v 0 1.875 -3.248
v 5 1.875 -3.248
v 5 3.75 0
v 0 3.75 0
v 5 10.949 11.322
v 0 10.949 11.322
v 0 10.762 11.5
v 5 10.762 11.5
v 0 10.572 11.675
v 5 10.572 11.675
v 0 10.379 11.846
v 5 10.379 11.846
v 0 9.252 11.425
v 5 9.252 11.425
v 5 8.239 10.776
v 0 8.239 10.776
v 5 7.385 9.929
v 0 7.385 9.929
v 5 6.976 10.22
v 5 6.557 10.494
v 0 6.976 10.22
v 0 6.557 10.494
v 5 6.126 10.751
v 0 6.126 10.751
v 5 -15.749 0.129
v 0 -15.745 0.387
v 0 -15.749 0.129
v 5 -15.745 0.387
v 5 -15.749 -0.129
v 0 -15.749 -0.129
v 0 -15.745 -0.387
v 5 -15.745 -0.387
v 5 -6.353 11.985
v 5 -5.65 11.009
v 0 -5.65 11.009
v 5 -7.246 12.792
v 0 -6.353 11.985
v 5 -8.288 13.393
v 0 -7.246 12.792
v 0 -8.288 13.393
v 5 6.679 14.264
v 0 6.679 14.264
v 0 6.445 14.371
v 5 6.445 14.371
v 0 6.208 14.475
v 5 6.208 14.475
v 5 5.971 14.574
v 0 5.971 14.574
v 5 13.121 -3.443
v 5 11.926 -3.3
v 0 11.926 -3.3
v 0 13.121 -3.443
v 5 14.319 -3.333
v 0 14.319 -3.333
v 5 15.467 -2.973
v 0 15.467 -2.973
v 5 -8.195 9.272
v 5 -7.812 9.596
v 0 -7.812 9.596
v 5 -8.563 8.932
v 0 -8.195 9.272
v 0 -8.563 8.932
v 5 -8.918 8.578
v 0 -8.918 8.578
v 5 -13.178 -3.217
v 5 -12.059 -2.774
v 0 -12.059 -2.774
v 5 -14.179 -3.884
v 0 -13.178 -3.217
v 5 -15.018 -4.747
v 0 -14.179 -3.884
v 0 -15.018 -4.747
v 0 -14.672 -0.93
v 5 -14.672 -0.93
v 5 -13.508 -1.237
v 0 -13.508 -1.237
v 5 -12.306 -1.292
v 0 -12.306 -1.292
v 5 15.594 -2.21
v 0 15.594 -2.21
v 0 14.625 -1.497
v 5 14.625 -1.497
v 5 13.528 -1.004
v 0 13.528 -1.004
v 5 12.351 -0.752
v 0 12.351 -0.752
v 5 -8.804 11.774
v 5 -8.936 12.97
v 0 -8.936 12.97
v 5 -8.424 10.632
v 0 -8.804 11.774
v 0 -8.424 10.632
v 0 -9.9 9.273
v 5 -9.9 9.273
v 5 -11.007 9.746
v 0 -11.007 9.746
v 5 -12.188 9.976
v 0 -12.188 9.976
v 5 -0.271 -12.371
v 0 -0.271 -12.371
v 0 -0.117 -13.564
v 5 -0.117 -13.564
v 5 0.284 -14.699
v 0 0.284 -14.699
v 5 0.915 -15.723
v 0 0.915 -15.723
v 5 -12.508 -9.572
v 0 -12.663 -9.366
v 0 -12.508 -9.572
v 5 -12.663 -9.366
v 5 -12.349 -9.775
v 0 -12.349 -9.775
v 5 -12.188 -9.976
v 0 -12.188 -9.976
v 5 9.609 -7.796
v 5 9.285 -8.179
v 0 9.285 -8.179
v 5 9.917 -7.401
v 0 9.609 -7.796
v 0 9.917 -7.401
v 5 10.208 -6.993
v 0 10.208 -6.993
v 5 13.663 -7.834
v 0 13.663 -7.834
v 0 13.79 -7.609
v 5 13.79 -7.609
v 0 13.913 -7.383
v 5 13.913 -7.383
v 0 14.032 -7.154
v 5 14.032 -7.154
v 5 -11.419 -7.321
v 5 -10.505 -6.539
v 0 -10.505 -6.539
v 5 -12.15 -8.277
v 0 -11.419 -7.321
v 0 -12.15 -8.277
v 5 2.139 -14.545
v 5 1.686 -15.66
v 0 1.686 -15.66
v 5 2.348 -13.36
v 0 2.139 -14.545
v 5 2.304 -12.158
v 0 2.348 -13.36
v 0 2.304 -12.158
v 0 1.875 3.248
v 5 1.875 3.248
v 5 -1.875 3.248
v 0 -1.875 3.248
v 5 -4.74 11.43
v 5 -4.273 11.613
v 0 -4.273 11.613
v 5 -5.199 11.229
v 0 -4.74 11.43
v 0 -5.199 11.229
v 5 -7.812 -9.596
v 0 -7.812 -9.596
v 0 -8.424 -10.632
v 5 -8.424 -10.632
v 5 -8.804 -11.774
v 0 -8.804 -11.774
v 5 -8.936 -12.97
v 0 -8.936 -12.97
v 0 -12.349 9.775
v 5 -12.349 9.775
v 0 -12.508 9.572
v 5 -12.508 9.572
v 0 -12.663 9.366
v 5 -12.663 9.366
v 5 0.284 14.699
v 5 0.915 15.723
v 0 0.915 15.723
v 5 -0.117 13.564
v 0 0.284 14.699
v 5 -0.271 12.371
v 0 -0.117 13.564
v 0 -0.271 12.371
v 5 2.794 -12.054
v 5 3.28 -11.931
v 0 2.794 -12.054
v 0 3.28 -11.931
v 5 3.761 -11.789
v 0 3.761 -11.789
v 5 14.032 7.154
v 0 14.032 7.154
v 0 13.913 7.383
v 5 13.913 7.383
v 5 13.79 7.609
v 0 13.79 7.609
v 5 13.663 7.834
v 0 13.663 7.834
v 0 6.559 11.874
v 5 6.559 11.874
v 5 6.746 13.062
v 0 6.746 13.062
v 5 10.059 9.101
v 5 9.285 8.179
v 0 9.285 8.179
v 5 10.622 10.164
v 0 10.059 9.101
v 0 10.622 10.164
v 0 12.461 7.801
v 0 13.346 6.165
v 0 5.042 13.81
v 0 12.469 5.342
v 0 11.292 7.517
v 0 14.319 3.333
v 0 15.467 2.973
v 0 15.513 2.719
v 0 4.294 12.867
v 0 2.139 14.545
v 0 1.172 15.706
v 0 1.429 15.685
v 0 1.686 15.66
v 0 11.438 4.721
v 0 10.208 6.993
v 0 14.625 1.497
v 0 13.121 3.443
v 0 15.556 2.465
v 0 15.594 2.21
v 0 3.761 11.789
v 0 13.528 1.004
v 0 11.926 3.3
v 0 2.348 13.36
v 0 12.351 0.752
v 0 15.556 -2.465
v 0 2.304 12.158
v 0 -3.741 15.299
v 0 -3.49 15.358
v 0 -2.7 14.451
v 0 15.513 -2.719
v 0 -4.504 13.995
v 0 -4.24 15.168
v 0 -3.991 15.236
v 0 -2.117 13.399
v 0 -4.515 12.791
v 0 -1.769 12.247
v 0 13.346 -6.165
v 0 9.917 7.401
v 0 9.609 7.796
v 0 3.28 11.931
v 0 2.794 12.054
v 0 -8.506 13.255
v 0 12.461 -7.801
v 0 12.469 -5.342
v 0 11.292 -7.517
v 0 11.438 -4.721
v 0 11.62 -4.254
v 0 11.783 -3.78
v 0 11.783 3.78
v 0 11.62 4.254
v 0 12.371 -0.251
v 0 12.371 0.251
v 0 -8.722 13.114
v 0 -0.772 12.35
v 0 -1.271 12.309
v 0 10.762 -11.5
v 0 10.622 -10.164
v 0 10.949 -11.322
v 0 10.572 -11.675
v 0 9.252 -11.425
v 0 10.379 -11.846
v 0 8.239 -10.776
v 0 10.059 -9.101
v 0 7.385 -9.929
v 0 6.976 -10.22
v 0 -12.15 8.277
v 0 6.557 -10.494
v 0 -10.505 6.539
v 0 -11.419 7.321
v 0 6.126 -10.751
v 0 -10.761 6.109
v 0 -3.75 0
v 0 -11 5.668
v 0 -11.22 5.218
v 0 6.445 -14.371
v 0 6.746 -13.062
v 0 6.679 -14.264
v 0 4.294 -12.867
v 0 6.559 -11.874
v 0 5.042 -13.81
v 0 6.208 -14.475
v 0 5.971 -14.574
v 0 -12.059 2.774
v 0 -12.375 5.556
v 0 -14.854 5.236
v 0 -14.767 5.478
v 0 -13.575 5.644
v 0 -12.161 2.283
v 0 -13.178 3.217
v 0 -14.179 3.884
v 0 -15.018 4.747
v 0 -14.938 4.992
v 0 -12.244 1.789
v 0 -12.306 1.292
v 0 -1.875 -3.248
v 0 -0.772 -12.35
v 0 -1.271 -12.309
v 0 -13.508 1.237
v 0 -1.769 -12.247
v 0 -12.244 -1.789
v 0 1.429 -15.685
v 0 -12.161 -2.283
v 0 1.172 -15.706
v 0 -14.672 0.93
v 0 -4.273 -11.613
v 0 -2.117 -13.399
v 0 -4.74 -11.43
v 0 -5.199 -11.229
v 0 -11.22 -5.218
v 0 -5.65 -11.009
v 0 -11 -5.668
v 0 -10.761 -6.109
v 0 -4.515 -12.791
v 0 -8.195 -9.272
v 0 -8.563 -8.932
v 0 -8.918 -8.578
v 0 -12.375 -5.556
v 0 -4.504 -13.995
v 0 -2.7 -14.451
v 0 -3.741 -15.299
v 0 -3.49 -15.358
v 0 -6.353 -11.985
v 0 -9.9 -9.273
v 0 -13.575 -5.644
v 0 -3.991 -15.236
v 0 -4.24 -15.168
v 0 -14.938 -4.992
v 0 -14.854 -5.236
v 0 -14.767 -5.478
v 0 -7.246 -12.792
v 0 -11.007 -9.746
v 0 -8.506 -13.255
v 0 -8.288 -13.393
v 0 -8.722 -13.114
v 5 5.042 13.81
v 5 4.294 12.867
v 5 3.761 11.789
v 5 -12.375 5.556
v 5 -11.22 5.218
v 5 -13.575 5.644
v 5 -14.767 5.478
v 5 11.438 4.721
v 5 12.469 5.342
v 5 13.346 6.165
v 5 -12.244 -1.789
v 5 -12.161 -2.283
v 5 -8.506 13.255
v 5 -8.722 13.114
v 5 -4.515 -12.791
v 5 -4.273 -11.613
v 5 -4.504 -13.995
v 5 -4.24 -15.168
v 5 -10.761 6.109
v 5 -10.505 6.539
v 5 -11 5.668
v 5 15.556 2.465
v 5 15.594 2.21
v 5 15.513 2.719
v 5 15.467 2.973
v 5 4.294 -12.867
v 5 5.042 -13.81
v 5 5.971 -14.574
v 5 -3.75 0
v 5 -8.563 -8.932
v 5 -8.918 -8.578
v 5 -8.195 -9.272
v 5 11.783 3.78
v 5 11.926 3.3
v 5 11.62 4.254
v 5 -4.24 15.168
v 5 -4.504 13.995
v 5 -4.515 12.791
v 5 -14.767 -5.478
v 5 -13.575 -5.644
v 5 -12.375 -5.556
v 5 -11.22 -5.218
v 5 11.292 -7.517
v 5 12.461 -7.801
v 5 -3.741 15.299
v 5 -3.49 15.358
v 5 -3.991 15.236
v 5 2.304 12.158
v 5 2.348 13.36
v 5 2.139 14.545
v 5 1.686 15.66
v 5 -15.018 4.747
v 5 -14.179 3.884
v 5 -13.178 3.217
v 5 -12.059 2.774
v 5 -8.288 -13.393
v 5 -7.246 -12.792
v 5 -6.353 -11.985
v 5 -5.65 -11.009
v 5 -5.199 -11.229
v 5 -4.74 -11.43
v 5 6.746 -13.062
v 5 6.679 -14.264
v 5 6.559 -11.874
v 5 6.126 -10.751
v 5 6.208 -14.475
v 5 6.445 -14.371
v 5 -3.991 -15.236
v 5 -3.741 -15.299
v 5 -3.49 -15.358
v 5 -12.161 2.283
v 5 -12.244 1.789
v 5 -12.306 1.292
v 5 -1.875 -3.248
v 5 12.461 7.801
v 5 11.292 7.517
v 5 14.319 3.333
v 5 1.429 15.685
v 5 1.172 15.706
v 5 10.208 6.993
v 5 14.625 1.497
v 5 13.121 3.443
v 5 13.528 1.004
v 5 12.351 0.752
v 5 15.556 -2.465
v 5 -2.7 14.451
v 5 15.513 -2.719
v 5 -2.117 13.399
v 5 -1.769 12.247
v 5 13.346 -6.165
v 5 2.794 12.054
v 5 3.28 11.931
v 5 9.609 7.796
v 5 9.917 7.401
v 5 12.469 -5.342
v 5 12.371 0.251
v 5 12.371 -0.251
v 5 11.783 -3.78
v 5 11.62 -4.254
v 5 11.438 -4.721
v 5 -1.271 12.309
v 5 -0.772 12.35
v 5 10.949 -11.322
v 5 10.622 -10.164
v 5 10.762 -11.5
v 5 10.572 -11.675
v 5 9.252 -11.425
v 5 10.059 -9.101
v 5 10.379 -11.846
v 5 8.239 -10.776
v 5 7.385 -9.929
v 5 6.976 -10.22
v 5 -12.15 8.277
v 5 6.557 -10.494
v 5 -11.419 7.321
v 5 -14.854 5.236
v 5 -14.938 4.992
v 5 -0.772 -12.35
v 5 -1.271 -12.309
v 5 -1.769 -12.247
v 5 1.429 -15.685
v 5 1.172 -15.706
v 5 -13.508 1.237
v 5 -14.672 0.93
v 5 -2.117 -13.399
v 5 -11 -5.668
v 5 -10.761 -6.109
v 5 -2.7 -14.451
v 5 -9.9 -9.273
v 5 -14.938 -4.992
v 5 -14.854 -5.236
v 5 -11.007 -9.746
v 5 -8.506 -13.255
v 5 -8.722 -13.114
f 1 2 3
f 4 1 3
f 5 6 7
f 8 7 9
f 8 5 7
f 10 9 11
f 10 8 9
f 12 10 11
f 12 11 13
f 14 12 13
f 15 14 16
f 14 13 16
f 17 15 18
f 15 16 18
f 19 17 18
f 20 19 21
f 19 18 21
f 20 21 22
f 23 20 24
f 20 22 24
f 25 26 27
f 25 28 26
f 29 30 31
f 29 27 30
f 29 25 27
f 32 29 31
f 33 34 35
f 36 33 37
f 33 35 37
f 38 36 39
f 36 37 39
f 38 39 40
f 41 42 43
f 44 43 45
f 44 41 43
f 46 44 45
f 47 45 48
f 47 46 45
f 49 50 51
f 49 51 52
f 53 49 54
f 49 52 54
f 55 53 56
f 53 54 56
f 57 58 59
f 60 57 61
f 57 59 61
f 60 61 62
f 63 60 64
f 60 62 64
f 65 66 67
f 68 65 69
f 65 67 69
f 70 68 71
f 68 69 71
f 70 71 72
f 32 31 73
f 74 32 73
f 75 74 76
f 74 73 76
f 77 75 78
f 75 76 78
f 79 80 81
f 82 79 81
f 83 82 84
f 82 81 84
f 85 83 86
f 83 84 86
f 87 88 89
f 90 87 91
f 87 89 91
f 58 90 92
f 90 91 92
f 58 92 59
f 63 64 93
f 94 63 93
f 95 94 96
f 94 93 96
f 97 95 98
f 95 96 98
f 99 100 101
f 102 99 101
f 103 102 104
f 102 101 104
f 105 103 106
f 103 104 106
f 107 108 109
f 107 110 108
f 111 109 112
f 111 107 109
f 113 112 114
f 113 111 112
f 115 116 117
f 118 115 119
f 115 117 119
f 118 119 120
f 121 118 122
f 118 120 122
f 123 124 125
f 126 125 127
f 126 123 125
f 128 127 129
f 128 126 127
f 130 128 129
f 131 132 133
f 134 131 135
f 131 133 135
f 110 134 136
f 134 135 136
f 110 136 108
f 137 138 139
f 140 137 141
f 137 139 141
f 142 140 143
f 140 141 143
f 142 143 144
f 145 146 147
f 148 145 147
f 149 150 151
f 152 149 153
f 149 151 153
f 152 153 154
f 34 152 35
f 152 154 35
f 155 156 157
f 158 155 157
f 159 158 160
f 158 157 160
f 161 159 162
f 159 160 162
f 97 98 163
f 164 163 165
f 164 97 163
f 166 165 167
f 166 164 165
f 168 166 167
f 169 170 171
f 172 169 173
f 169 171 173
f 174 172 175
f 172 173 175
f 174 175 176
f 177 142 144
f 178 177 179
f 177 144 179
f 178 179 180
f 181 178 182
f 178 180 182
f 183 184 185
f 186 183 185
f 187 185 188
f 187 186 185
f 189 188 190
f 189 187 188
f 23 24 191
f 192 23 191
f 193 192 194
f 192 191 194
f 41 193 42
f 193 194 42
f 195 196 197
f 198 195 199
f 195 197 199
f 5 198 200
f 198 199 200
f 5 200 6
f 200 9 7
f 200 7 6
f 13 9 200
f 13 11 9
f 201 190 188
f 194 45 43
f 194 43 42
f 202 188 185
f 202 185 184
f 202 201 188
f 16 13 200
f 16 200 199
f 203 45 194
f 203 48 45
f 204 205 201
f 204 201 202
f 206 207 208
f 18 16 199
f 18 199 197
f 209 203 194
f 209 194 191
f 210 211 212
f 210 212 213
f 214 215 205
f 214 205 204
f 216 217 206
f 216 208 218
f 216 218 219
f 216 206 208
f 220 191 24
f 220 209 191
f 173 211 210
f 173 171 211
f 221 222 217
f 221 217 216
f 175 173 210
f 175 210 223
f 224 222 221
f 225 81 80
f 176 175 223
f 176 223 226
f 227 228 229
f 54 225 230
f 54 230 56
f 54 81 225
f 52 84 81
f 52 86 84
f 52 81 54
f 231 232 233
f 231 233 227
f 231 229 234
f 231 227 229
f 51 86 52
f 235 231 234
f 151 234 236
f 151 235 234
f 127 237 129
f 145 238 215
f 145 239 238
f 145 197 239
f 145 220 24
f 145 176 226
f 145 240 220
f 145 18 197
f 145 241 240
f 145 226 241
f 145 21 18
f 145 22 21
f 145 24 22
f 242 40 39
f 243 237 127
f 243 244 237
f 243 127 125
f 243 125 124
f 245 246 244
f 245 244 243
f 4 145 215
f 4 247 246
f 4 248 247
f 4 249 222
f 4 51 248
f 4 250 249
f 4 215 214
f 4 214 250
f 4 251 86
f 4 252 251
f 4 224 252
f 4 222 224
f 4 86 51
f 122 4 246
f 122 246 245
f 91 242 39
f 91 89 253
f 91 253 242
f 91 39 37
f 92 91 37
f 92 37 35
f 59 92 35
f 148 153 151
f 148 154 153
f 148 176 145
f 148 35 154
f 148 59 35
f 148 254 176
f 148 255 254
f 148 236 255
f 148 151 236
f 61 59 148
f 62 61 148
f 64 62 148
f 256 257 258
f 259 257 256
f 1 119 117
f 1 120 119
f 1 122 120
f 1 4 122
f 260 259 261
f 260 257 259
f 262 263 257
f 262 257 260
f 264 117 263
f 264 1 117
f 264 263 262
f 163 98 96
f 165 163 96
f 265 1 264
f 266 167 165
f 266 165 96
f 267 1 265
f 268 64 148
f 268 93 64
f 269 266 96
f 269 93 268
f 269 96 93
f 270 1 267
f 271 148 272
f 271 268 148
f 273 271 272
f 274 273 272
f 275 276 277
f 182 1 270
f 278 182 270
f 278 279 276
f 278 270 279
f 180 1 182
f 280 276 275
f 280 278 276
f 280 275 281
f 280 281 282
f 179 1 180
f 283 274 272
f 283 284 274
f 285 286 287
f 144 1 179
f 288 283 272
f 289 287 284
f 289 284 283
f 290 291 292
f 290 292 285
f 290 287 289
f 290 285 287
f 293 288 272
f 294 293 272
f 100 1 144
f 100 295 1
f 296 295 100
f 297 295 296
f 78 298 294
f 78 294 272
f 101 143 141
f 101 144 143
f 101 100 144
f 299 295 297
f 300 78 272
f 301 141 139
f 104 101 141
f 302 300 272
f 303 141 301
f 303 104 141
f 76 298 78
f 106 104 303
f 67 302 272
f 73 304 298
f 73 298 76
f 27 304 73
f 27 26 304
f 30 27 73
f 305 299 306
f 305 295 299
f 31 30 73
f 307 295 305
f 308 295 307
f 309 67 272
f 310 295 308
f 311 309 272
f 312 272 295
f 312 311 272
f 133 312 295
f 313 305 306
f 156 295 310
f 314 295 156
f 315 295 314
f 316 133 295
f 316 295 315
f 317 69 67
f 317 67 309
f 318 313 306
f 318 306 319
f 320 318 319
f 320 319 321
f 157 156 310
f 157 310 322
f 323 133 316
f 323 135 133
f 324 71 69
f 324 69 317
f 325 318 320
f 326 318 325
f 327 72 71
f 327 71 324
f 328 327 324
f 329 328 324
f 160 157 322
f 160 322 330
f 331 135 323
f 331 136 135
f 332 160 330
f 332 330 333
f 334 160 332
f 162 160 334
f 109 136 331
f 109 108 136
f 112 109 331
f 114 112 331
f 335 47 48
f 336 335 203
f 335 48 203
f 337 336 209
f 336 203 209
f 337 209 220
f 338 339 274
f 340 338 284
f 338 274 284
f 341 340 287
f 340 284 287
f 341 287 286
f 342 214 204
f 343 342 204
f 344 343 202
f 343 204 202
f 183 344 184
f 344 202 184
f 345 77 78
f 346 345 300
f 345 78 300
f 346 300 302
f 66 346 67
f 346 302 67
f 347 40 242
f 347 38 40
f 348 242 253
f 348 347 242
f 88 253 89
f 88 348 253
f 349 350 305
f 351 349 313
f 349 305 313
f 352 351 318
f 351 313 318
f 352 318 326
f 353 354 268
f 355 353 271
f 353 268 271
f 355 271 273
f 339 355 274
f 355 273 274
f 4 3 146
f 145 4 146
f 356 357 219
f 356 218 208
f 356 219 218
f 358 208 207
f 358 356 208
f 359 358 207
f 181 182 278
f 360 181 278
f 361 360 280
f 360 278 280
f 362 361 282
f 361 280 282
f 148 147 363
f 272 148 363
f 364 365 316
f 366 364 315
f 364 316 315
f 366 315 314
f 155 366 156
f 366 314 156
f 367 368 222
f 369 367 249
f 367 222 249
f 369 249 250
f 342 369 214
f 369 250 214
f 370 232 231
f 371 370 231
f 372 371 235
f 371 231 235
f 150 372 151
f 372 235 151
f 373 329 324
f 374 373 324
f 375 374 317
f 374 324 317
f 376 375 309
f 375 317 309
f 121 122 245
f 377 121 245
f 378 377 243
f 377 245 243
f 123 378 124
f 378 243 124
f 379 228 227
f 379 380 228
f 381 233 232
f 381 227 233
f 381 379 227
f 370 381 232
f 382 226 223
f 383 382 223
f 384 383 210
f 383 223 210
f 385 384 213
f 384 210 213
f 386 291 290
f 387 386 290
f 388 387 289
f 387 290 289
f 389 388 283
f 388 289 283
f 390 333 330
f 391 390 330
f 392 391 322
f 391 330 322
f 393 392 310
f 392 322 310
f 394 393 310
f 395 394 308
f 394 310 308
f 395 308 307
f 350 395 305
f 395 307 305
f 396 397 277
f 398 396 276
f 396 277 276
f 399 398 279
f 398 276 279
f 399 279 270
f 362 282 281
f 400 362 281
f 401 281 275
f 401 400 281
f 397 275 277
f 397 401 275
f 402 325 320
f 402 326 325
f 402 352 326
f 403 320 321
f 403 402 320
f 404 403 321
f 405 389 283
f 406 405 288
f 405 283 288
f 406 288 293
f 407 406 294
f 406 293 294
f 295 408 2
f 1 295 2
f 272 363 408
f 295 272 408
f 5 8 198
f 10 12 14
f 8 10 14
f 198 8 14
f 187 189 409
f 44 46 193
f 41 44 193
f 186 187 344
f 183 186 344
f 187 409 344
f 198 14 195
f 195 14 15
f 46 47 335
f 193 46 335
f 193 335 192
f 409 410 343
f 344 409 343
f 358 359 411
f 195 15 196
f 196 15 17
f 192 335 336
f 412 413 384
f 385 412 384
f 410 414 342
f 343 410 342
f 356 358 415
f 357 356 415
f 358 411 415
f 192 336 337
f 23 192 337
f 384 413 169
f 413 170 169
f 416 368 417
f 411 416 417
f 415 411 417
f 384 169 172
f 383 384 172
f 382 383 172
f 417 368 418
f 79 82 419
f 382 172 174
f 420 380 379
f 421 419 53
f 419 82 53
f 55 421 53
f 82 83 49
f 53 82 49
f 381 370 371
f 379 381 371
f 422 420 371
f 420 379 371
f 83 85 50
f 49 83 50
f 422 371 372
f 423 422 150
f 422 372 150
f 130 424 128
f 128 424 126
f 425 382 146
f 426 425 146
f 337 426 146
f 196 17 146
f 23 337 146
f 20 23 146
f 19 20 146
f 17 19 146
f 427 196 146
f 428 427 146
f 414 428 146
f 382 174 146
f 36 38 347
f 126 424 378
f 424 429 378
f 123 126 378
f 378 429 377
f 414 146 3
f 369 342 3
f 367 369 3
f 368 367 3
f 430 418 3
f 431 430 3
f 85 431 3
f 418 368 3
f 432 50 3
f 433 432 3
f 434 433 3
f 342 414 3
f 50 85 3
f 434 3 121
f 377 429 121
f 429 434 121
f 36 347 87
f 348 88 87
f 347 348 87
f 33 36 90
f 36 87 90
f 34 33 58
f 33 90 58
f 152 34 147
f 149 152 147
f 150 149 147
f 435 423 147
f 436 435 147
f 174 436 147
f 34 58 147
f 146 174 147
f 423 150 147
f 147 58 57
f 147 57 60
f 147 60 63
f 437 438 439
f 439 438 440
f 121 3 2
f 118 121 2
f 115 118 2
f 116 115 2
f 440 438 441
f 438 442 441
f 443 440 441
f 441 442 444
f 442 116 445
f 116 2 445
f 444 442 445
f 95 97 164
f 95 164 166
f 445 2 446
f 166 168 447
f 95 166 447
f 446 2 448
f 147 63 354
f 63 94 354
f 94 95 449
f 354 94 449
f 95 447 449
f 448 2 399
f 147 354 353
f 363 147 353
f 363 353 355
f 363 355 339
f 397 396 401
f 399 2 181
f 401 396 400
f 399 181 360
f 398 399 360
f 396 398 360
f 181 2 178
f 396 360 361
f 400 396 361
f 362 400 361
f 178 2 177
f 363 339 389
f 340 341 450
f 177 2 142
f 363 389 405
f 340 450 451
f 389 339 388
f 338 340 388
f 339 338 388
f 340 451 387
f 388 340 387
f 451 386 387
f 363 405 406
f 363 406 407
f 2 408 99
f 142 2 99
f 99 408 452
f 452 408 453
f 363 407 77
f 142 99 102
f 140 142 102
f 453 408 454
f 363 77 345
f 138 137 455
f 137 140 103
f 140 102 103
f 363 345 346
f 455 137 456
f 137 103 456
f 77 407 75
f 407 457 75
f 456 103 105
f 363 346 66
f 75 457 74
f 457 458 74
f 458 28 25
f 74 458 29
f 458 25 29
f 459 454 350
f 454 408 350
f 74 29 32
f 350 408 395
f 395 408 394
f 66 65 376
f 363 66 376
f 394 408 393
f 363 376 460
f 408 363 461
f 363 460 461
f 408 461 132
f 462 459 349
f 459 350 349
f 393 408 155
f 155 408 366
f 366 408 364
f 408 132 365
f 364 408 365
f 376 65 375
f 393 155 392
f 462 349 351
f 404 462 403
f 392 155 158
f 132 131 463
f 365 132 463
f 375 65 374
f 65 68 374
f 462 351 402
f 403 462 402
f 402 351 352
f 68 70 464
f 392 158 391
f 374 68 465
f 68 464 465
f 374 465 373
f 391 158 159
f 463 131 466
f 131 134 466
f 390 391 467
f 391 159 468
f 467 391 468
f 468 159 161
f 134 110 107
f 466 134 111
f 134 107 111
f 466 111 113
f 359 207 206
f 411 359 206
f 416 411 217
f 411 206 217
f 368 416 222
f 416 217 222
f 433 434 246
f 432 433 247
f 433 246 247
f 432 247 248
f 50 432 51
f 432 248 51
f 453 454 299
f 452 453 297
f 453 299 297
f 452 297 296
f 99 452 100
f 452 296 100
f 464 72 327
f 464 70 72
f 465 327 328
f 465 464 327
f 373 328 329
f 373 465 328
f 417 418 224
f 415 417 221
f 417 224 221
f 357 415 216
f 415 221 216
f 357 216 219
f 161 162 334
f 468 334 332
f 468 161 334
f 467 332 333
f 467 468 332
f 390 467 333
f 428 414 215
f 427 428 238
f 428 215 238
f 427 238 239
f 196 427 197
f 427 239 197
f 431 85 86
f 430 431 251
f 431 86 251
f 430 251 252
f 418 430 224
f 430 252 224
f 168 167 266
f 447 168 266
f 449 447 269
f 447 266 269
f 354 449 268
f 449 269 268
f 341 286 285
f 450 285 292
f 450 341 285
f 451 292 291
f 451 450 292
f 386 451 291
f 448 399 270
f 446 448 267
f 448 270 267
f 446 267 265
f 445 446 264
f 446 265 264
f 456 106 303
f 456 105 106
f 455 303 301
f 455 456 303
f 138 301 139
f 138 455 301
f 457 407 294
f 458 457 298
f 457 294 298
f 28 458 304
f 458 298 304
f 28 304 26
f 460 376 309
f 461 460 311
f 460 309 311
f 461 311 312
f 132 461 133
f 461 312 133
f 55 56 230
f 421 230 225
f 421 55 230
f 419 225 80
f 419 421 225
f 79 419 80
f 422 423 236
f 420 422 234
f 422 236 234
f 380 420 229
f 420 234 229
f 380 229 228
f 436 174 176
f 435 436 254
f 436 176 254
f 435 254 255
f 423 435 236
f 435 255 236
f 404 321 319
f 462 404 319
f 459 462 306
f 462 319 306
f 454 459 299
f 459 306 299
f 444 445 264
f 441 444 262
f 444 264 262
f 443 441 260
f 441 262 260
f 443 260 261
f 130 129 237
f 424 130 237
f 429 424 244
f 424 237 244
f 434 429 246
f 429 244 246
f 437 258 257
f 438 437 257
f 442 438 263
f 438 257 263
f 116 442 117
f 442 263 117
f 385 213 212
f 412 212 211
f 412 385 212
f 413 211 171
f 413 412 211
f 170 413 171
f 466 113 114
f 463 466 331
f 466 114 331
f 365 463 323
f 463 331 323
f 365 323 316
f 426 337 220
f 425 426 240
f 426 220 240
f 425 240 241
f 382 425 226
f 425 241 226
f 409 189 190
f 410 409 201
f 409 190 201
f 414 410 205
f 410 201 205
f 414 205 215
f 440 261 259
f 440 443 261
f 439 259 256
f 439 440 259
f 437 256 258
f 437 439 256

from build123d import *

# Parameters (mm, degrees)
BASPROSKE_W     = 5
BASPROSKE_H     = 15.75
TOOTHCUT_DEPTH  = 23.828162432
TEETHCUTS_COUNT = 19
TEETHCUTS_ANGLE = 341.052631579
BORE_DEPTH      = 50.0000508


with BuildPart() as part:
    # BasProSke → Base-Revolve (revolve)
    with BuildSketch(Plane(origin=(0, 0, 0), x_dir=(1, 0, 0), z_dir=(0, 1, 0)), mode=Mode.PRIVATE) as base_revolve_sk:
        with Locations((2.5, 7.875)):
            Rectangle(BASPROSKE_W, BASPROSKE_H)
    revolve(base_revolve_sk.sketch.rotate(Axis((-10, 0, 0), (1, 0, 0)), 180), axis=Axis((-10, 0, 0), (1, 0, 0)))

    # TooCutSke → ToothCut (cut, through all)
    with BuildSketch(Plane(origin=(0, 0, 0), x_dir=(0, 0, -1), z_dir=(1, 0, 0))):
        with BuildLine():
            ThreePointArc((0.751505376, 12.351158475), (0, 12.374), (-0.751505376, 12.351158475))
            ThreePointArc((-0.751505376, 12.351158475), (-1.227741339, 14.103349268), (-2.230855439, 15.616866817))
            ThreePointArc((-2.230855439, 15.616866817), (0, 15.7754), (2.230855439, 15.616866817))
            ThreePointArc((2.230855439, 15.616866817), (1.227741339, 14.103349268), (0.751505376, 12.351158475))
        make_face()
    toothcut = extrude(amount=TOOTHCUT_DEPTH, mode=Mode.SUBTRACT)

    # TeethCuts: ToothCut ×19 about axis
    teethcuts_axis = Axis((-10, 0, 0), (1, 0, 0))
    for i in range(1, TEETHCUTS_COUNT):
        add(toothcut.rotate(teethcuts_axis, i * TEETHCUTS_ANGLE / (TEETHCUTS_COUNT - 1)), mode=Mode.SUBTRACT)

    # BorSke → Bore (cut, symmetric)
    with BuildSketch(Plane(origin=(0, 0, 0), x_dir=(0, 0, -1), z_dir=(1, 0, 0))):
        Polygon((0, 3.75), (-3.247595264, 1.875), (-3.247595264, -1.875), (0, -3.75), (3.247595264, -1.875), (3.247595264, 1.875), align=None)
    extrude(amount=BORE_DEPTH, both=True, mode=Mode.SUBTRACT)


solid = part.part
